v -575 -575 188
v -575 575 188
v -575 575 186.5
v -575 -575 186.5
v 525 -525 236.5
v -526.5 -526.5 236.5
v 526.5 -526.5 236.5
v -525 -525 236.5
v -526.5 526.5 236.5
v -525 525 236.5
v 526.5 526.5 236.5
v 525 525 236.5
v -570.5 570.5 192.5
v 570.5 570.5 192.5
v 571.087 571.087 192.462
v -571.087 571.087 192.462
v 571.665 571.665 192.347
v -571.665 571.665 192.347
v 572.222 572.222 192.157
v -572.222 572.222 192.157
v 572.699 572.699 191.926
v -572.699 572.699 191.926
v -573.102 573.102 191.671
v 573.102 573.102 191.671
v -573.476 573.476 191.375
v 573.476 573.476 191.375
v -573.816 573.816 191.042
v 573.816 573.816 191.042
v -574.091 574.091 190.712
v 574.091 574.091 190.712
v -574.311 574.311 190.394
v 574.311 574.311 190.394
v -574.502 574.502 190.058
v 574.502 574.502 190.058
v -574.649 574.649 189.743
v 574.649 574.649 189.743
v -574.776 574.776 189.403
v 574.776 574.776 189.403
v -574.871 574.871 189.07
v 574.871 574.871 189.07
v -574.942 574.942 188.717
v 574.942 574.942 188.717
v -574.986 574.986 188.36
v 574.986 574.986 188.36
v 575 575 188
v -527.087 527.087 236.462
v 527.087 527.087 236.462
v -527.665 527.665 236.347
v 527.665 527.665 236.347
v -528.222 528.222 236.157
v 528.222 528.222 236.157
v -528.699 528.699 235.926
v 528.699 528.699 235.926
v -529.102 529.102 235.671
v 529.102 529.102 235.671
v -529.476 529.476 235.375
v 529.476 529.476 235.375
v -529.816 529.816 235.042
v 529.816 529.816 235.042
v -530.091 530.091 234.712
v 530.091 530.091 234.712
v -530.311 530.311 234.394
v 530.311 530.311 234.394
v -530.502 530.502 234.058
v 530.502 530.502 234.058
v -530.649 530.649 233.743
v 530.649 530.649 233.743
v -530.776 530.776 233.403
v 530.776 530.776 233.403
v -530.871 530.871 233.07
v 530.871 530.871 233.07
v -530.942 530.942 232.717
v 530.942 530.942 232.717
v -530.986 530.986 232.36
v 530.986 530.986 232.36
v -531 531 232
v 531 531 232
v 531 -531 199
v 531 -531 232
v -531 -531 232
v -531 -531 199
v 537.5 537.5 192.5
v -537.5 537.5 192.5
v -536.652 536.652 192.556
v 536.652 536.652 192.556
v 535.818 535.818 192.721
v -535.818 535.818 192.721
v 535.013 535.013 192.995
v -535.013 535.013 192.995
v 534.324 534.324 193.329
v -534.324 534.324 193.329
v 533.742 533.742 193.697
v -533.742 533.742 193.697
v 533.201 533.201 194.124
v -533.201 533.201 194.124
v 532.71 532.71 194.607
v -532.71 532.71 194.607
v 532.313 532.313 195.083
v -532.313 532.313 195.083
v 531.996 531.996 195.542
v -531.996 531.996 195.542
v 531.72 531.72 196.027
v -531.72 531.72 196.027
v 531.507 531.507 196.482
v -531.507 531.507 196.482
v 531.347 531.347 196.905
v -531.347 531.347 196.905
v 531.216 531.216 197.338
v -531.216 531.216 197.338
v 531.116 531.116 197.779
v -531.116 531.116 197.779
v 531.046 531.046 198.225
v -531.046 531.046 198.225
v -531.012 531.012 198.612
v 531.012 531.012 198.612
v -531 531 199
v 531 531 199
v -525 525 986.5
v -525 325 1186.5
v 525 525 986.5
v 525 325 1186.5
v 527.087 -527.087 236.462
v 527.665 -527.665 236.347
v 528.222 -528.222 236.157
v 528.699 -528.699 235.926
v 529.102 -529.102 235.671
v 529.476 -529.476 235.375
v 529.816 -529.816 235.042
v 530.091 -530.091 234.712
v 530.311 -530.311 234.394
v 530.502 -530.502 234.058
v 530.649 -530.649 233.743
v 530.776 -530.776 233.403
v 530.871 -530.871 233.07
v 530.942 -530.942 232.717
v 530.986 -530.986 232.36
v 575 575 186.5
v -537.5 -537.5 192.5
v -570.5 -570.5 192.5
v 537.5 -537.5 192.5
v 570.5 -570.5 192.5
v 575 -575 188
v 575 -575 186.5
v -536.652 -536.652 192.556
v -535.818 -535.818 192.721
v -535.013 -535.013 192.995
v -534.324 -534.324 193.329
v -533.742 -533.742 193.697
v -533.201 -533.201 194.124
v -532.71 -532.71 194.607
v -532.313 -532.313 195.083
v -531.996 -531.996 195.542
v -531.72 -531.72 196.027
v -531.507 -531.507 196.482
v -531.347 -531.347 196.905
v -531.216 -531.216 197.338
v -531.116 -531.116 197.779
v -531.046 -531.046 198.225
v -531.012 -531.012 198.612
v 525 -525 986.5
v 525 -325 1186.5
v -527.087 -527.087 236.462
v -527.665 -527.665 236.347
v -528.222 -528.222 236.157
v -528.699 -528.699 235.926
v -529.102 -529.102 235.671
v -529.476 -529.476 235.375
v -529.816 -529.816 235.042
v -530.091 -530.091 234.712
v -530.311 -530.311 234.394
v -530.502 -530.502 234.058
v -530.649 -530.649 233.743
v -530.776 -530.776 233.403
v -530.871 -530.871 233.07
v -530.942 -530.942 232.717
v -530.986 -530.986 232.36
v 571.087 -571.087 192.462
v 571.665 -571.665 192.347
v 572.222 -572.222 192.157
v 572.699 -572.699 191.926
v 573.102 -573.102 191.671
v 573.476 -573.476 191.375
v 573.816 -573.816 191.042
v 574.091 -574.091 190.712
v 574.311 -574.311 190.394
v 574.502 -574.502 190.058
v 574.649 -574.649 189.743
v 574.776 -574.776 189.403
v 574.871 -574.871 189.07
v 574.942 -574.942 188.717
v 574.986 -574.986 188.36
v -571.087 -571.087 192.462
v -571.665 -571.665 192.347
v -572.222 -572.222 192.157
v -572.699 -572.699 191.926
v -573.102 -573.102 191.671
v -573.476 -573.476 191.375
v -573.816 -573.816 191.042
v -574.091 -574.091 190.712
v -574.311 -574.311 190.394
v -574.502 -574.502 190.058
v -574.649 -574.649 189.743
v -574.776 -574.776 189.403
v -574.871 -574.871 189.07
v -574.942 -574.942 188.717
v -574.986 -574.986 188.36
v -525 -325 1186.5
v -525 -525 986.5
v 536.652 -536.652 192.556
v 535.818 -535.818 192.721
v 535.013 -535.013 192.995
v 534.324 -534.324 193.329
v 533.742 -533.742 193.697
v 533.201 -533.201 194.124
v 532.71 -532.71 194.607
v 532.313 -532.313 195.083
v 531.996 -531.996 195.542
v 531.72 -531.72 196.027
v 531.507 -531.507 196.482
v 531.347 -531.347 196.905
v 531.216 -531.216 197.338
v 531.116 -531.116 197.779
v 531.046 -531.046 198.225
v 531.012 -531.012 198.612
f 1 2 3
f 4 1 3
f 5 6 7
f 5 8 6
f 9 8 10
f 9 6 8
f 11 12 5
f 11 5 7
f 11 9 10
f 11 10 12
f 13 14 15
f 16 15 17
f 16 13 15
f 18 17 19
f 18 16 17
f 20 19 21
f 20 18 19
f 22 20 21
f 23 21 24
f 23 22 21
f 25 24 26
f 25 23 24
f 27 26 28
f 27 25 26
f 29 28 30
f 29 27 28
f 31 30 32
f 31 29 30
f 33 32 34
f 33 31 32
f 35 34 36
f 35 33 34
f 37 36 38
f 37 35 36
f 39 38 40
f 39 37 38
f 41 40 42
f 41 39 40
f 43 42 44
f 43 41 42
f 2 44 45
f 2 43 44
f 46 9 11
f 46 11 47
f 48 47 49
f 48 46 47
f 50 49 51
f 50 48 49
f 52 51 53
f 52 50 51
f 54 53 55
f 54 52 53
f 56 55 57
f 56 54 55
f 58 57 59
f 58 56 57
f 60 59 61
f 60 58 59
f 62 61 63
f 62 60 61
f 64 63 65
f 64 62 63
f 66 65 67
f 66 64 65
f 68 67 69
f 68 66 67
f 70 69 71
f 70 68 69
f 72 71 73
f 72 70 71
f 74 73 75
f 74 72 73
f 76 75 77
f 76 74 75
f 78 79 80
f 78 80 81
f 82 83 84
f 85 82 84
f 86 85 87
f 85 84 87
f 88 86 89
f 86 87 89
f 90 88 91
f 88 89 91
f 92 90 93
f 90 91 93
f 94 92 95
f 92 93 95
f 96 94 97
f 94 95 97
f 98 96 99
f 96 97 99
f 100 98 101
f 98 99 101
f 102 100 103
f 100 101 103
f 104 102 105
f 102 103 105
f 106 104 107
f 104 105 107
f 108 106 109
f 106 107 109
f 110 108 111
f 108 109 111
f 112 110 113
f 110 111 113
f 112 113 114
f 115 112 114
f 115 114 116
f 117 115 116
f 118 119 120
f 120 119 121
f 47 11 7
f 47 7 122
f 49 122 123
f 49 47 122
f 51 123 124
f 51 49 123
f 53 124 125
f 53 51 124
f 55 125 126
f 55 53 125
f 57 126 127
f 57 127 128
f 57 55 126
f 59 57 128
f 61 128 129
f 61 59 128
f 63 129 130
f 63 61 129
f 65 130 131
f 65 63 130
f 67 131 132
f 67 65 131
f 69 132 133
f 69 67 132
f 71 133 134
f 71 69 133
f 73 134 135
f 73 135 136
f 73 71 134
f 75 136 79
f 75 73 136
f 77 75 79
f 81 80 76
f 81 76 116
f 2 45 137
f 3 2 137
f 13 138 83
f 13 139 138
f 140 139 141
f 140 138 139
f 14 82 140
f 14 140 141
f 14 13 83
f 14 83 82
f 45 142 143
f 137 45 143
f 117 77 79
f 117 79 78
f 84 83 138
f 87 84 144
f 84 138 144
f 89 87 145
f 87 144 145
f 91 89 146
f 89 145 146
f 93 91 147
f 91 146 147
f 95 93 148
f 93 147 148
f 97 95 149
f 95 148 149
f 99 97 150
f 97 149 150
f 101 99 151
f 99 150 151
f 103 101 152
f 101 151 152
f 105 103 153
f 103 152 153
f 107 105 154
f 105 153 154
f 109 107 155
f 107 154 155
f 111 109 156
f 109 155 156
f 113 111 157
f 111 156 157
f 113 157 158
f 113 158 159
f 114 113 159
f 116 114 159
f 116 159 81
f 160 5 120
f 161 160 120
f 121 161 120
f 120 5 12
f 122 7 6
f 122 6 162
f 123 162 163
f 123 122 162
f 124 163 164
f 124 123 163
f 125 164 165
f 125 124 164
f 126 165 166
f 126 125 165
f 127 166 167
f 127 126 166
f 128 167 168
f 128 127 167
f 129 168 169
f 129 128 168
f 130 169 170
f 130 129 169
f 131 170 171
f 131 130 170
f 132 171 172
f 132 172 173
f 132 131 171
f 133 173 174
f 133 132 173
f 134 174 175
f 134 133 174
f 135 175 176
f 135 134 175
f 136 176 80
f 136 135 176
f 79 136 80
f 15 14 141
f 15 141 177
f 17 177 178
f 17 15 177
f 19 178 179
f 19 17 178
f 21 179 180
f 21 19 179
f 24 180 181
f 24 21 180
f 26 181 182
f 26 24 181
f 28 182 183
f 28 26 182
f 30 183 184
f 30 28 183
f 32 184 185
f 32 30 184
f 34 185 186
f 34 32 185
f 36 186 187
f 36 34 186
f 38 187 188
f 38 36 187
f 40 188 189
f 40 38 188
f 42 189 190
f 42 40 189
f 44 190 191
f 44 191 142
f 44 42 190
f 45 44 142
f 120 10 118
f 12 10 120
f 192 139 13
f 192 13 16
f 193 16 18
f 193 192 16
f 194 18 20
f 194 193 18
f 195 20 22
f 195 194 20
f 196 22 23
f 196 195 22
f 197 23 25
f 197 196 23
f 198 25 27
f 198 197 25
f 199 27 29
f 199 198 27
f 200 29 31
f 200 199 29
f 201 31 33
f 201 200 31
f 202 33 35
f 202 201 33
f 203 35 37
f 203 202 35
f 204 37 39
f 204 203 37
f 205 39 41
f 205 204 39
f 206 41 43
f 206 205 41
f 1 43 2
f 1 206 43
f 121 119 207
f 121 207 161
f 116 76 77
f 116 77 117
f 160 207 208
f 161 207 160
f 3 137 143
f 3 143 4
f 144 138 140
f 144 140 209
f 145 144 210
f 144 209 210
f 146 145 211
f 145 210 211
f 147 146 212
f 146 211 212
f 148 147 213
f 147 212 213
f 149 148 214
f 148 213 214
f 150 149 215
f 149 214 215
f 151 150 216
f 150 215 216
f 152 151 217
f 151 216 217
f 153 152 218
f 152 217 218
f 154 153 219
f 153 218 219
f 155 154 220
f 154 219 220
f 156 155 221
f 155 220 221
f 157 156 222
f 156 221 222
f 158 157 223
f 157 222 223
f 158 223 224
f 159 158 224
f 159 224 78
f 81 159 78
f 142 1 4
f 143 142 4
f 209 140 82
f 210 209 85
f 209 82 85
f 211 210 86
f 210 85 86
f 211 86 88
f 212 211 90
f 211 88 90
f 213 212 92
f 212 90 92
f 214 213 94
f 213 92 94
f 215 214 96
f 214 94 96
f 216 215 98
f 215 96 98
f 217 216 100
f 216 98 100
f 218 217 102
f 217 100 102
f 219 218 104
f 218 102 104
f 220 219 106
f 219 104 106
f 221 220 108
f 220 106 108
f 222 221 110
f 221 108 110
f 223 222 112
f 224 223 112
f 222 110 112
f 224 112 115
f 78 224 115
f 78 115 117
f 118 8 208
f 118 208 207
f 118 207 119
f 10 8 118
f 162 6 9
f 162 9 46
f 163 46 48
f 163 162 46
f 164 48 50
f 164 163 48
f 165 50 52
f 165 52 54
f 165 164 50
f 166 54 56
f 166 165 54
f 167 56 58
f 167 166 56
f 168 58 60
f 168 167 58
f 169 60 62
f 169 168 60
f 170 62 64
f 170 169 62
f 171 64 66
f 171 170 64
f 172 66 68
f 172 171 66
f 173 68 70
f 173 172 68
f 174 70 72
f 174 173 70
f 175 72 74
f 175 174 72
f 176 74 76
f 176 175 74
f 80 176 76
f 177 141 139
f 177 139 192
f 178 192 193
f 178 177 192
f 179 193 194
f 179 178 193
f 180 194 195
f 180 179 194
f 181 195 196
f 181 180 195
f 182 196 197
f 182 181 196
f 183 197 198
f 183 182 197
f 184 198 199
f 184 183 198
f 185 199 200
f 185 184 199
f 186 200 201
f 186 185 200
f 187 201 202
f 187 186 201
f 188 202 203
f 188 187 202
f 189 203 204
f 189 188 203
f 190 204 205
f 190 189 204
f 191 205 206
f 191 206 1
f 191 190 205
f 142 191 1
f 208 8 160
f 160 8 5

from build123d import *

# Parameters (mm, degrees)
SKETCH_W     = 1050
SKETCH_H     = 1050
PAD_DEPTH    = 1000
CHAMFER_SIZE = 200


with BuildPart() as chamfer_body:
    # Sketch → Pad (new body)
    with BuildSketch(Plane.XY):
        Rectangle(SKETCH_W, SKETCH_H)
    extrude(amount=PAD_DEPTH)

    # Chamfer
    chamfer_edges = [chamfer_body.edges().sort_by_distance(p)[0] for p in [
        (0, 525, 1000),
        (0, -525, 1000),
    ]]
    chamfer(chamfer_edges, length=CHAMFER_SIZE)


with BuildPart() as fusion:
    # Sweep: sweep along a path in Sketch001
    with BuildLine(Plane.XY) as sweep_path:
        Line((525, -525), (525, 525))
        Line((525, 525), (-525, 525))
        Line((-525, 525), (-525, -525))
        Line((-525, -525), (525, -525))
    # AngleSteel → Sweep (sweep)
    with BuildSketch(Plane(origin=(539.3963419701, 0, 14.3963419701), x_dir=(1, 0, 0), z_dir=(0, 1, 0))):
        with BuildLine():
            Line((-14.3963419701, 14.3963419701), (-14.3963419701, -35.6036580299))
            Line((-14.3963419701, -35.6036580299), (-12.8963419701, -35.6036580299))
            ThreePointArc((-12.8963419701, -35.6036580299), (-9.7143614548, -34.2856385452), (-8.3963419701, -31.1036580299))
            Line((-8.3963419701, -31.1036580299), (-8.3963419701, 1.8963419701))
            ThreePointArc((-8.3963419701, 1.8963419701), (-6.4925360478, 6.4925360478), (-1.8963419701, 8.3963419701))
            Line((-1.8963419701, 8.3963419701), (31.1036580299, 8.3963419701))
            ThreePointArc((31.1036580299, 8.3963419701), (34.2856385452, 9.7143614548), (35.6036580299, 12.8963419701))
            Line((35.6036580299, 12.8963419701), (35.6036580299, 14.3963419701))
            Line((35.6036580299, 14.3963419701), (-14.3963419701, 14.3963419701))
        make_face()
    sweep(path=sweep_path.line, is_frenet=True, transition=Transition.RIGHT)

    # Fusion: union Chamfer body
    add(chamfer_body.part)


with BuildPart() as fusion_1:
    # Fusion placement: moved
    add(fusion.part.moved(Location((0, 0, 186.5))))


solid = fusion_1.part
